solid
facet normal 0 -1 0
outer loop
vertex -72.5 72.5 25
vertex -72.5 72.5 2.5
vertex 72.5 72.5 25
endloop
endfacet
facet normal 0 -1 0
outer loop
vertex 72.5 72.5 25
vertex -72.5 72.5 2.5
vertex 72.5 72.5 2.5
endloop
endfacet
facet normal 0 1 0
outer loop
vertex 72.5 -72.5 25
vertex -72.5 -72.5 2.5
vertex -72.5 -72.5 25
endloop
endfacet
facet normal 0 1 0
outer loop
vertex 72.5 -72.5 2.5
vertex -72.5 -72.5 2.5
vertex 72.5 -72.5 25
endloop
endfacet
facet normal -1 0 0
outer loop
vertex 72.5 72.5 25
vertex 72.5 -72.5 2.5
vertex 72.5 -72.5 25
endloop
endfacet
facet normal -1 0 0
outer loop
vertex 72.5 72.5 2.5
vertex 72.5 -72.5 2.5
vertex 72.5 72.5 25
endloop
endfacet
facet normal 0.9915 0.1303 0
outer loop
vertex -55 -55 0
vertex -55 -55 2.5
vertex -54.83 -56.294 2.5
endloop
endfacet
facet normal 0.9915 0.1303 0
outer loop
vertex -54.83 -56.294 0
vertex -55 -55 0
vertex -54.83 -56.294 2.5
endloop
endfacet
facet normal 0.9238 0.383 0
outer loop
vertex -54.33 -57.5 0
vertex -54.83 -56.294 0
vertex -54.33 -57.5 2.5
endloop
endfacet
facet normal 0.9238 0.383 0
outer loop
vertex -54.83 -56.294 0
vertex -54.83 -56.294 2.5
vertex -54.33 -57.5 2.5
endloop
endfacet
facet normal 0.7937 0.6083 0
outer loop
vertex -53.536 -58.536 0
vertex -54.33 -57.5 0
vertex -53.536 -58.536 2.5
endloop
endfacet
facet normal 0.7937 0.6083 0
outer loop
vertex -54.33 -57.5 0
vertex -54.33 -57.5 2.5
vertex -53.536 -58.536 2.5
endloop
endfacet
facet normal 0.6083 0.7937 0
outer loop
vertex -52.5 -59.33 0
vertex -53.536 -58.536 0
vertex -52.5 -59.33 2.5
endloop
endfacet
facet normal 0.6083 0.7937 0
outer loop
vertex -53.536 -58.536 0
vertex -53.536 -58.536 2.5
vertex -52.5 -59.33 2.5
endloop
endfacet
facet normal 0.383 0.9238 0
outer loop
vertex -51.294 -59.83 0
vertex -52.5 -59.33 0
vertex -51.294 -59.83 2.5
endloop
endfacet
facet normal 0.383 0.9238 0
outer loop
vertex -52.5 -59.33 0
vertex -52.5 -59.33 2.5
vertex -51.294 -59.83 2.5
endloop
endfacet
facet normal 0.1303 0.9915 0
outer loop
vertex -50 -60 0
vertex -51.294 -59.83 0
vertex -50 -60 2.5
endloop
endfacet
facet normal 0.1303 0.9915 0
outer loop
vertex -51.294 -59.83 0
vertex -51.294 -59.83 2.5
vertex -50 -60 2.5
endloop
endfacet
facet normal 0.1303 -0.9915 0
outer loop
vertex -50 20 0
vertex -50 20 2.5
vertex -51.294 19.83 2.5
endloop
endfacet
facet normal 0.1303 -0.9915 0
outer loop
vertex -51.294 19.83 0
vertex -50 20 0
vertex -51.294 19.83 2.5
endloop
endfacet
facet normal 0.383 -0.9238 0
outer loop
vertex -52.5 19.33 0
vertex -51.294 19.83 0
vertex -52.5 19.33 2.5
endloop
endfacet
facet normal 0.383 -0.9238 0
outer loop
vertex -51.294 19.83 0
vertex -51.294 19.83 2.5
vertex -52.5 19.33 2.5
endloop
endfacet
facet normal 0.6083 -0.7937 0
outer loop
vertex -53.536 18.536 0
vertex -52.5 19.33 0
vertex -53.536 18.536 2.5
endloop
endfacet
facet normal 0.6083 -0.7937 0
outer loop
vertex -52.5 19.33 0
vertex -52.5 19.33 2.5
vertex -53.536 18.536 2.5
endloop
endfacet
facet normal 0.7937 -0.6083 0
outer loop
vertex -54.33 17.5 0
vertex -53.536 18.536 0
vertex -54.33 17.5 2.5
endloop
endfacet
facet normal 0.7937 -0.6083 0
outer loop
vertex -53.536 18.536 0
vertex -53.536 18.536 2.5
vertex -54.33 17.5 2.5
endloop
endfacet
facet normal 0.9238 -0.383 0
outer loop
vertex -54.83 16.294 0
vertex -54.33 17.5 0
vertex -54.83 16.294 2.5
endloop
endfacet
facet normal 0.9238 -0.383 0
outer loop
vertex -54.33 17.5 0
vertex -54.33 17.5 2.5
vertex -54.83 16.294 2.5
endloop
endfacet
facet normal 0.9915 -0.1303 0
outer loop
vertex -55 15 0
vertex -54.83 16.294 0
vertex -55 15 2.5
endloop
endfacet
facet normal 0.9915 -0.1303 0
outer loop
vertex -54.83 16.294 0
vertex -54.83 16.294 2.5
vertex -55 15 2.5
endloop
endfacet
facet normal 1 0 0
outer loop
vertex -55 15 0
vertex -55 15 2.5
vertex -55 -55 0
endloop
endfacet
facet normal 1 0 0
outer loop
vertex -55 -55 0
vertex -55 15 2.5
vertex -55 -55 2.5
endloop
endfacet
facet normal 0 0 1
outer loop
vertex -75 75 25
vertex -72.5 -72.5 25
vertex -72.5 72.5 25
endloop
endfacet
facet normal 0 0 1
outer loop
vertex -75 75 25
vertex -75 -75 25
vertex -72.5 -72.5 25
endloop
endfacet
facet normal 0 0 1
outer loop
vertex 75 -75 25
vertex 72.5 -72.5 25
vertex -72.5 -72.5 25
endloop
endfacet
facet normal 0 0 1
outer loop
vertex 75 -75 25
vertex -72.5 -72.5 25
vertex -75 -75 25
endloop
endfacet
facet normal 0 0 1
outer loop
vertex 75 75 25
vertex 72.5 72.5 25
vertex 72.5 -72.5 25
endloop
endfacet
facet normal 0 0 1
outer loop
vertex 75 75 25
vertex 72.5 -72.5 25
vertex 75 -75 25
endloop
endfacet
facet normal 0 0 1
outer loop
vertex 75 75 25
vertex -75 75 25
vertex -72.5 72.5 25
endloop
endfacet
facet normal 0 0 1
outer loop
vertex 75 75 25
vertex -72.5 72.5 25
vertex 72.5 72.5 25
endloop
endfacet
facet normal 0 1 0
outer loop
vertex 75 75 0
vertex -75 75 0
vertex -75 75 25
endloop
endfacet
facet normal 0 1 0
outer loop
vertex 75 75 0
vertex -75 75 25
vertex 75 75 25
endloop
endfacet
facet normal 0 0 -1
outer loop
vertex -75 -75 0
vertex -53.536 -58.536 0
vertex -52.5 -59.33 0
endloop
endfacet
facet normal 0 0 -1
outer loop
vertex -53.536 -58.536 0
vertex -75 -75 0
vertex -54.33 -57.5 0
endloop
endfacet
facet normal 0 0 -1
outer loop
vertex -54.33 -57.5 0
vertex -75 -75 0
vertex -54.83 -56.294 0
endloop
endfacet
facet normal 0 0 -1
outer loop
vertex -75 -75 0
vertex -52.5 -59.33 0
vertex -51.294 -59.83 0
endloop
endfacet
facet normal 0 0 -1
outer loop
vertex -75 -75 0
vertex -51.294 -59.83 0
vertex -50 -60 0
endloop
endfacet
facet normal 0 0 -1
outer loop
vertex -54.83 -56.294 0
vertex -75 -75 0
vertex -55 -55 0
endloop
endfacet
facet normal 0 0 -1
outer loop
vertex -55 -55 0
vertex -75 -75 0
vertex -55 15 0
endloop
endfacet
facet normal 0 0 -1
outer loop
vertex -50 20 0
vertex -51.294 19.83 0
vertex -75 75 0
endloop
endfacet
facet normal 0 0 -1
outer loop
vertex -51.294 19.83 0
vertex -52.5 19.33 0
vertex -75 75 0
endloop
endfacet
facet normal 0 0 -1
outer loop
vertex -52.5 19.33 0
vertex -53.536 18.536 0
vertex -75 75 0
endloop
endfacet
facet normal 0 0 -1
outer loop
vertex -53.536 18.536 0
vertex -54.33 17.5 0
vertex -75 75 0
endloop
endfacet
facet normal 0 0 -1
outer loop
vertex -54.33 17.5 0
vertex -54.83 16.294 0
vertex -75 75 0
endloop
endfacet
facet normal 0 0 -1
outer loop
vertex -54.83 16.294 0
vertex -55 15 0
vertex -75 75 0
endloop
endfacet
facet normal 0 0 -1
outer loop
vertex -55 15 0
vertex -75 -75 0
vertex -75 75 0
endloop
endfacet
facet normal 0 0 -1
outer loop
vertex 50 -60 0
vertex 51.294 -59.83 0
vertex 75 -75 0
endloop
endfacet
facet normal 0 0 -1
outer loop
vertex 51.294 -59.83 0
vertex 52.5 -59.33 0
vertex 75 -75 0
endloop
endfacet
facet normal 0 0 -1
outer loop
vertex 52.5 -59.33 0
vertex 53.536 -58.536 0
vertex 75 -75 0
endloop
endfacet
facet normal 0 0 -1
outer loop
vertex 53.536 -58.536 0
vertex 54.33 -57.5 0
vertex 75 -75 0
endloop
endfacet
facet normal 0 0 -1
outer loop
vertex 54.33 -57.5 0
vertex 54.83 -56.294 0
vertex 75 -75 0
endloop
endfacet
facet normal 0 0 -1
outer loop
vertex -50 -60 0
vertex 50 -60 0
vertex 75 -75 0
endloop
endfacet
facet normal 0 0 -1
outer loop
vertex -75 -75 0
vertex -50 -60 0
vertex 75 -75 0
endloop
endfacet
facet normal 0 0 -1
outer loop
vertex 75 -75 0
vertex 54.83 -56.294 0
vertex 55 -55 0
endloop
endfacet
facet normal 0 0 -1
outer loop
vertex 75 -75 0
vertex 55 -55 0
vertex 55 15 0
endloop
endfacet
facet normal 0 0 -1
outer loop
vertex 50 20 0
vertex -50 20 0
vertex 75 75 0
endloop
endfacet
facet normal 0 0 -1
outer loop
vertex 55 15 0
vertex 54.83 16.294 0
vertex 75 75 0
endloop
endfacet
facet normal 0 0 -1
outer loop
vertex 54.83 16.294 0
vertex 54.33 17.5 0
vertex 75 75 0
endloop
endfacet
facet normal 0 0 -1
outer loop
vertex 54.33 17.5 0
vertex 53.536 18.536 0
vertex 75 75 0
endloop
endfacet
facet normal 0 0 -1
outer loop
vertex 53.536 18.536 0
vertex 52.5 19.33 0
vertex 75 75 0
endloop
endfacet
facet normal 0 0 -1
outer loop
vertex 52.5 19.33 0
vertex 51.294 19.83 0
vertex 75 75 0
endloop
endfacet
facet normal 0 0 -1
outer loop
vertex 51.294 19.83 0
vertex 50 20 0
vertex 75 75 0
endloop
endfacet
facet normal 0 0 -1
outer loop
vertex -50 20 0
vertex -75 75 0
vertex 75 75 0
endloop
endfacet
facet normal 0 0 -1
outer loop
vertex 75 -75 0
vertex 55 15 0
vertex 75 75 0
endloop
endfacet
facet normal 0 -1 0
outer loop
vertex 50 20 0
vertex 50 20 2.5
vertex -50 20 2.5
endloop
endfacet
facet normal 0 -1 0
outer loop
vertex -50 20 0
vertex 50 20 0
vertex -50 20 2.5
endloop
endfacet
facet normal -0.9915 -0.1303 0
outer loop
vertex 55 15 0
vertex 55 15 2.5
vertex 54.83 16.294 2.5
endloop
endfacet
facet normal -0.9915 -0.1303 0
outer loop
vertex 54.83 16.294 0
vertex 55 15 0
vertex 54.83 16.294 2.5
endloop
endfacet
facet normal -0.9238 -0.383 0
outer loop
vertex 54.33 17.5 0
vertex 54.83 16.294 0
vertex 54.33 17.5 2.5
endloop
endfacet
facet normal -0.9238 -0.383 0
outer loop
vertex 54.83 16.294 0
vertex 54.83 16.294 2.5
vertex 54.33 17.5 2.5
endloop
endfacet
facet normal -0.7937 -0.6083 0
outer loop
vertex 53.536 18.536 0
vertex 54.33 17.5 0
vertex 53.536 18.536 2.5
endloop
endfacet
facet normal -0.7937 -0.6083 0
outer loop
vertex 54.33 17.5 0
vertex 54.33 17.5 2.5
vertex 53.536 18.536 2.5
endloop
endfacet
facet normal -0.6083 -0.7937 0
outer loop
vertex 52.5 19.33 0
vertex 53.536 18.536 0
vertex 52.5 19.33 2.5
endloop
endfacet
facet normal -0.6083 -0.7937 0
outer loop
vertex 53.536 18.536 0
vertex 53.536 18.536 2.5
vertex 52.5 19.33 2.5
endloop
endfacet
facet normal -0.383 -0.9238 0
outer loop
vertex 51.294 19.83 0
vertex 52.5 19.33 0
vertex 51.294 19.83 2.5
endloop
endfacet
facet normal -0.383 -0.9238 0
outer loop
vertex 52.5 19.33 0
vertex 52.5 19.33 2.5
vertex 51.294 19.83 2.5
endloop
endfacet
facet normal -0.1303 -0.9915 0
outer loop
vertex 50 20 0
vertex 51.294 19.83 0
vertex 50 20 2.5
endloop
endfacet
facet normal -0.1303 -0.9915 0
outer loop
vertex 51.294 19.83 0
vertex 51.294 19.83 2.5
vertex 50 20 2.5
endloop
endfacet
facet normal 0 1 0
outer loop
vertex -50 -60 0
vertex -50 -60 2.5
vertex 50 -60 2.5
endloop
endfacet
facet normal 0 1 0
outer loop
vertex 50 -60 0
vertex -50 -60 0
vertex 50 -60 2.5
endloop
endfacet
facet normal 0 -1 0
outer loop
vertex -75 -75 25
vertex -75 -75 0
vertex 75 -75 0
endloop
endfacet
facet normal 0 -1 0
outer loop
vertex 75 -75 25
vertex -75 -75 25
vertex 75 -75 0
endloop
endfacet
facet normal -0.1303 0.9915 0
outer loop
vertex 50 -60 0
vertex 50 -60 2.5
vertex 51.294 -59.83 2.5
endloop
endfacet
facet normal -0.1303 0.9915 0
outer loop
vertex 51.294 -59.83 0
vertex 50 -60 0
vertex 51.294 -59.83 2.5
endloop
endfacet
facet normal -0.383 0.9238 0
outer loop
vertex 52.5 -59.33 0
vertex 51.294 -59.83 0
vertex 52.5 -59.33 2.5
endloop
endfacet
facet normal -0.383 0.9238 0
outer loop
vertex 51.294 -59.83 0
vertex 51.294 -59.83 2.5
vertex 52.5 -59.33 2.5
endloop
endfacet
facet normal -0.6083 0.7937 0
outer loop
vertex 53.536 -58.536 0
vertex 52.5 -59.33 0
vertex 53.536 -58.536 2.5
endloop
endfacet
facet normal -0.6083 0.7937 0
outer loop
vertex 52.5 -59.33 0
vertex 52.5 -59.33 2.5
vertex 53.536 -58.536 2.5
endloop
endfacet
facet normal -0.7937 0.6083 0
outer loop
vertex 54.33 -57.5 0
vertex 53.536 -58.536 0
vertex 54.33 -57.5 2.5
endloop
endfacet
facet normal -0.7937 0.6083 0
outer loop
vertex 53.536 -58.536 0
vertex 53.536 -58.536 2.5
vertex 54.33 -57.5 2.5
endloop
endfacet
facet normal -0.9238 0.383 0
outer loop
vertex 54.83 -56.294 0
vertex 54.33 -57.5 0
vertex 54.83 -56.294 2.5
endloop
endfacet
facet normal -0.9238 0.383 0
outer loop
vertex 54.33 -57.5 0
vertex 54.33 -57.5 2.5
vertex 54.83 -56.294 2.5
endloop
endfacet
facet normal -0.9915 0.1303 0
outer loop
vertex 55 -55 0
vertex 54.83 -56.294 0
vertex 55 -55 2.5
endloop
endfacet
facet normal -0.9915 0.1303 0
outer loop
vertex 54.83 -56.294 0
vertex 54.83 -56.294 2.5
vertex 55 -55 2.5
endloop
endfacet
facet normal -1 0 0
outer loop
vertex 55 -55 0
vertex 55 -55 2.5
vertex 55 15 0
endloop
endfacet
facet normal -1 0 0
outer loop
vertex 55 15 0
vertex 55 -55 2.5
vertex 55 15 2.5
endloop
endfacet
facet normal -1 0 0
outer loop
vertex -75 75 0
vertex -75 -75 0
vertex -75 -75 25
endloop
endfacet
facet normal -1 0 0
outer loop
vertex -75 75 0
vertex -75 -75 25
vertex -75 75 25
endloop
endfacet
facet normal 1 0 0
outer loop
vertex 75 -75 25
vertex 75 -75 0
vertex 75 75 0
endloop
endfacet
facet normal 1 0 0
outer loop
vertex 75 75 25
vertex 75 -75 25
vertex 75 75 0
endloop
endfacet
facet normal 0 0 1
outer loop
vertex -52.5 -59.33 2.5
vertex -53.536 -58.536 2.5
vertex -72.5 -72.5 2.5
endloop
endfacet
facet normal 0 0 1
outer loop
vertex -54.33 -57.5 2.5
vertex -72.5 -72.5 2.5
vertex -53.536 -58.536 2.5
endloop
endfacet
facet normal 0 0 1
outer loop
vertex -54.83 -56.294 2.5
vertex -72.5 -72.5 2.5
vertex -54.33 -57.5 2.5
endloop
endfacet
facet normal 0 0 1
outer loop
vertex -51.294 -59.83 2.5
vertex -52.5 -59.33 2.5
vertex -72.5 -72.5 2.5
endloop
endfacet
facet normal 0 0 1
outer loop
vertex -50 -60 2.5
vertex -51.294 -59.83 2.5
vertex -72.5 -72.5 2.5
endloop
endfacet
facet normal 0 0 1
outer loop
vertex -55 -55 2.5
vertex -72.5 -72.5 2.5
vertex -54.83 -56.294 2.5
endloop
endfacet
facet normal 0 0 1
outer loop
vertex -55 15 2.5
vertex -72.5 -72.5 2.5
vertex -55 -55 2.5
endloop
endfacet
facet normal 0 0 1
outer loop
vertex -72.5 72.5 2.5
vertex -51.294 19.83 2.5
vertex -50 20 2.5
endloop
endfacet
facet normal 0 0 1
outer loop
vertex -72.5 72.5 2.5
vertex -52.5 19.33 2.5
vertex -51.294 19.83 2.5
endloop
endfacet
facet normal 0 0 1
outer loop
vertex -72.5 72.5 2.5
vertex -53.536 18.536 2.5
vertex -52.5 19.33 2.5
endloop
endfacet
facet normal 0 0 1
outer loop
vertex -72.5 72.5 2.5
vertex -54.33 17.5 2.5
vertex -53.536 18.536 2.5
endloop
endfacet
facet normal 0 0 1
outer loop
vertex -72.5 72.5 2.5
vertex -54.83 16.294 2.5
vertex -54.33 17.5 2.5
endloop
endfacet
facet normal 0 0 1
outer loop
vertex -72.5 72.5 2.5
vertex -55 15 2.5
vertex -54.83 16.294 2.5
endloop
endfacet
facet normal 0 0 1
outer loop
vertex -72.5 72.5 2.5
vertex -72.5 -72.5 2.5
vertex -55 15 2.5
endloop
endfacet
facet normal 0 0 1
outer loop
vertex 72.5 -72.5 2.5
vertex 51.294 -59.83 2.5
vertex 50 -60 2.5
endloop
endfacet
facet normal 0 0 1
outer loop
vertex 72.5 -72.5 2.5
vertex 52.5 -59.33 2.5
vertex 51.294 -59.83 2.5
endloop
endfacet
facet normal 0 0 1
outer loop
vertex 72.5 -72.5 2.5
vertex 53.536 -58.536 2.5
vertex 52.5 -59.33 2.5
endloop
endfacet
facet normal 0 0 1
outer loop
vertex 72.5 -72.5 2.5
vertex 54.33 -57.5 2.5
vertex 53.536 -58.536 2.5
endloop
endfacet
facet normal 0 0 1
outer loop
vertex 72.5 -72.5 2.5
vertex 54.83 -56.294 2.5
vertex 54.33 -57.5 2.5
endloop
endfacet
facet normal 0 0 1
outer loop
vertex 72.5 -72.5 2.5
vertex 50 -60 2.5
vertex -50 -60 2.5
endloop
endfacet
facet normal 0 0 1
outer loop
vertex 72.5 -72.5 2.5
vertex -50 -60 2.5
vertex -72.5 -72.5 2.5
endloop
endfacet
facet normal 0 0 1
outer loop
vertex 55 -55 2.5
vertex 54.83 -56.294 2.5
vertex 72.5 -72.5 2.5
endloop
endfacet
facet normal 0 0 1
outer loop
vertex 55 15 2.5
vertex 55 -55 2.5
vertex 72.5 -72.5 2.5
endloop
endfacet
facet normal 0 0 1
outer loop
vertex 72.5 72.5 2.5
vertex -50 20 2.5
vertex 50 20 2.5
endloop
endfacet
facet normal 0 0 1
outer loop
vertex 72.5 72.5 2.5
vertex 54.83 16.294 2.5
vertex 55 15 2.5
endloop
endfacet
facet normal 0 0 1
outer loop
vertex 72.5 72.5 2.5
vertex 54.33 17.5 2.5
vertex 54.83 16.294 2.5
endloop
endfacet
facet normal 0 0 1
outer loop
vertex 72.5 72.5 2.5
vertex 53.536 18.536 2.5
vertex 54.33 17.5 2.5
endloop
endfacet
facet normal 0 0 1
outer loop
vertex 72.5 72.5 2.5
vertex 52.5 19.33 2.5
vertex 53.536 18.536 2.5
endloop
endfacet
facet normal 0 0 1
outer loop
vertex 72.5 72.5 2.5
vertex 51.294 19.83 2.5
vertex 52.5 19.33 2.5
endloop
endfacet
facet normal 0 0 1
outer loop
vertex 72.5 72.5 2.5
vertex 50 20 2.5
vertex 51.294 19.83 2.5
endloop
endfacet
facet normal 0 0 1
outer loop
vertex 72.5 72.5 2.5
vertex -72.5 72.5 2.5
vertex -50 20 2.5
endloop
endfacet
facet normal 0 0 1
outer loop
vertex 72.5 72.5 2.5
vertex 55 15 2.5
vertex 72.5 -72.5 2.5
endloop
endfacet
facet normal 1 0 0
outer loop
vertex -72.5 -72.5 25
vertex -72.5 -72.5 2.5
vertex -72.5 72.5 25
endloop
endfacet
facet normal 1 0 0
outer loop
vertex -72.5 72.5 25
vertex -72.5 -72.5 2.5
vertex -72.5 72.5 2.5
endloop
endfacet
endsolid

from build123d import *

# Parameters (mm, degrees)
F0_W     = 150
F0_H     = 150
F1_DEPTH = 25
F2_T     = -2.5
F4_DEPTH = 25


with BuildPart() as f1:
    # F0 (on Top) → F1 (new body)
    with BuildSketch(Plane.XY):
        Rectangle(F0_W, F0_H)
    extrude(amount=F1_DEPTH)

    # F2
    f2_openings = [f1.faces().sort_by_distance(p)[0] for p in [
        (0, 0, 25),
    ]]
    offset(amount=F2_T, openings=f2_openings)

    # F3 (on face) → F4 (cut)
    with BuildSketch(Plane.XY.offset(2.5)):
        with BuildLine():
            Line((50, 20), (-50, 20))
            ThreePointArc((-50, 20), (-53.535534, 18.535534), (-55, 15))
            Line((-55, 15), (-55, -55))
            ThreePointArc((-55, -55), (-53.535534, -58.535534), (-50, -60))
            Line((-50, -60), (50, -60))
            ThreePointArc((50, -60), (53.535534, -58.535534), (55, -55))
            Line((55, -55), (55, 15))
            ThreePointArc((55, 15), (53.535534, 18.535534), (50, 20))
        make_face()
    extrude(amount=-F4_DEPTH, mode=Mode.SUBTRACT)


solid = f1.part
